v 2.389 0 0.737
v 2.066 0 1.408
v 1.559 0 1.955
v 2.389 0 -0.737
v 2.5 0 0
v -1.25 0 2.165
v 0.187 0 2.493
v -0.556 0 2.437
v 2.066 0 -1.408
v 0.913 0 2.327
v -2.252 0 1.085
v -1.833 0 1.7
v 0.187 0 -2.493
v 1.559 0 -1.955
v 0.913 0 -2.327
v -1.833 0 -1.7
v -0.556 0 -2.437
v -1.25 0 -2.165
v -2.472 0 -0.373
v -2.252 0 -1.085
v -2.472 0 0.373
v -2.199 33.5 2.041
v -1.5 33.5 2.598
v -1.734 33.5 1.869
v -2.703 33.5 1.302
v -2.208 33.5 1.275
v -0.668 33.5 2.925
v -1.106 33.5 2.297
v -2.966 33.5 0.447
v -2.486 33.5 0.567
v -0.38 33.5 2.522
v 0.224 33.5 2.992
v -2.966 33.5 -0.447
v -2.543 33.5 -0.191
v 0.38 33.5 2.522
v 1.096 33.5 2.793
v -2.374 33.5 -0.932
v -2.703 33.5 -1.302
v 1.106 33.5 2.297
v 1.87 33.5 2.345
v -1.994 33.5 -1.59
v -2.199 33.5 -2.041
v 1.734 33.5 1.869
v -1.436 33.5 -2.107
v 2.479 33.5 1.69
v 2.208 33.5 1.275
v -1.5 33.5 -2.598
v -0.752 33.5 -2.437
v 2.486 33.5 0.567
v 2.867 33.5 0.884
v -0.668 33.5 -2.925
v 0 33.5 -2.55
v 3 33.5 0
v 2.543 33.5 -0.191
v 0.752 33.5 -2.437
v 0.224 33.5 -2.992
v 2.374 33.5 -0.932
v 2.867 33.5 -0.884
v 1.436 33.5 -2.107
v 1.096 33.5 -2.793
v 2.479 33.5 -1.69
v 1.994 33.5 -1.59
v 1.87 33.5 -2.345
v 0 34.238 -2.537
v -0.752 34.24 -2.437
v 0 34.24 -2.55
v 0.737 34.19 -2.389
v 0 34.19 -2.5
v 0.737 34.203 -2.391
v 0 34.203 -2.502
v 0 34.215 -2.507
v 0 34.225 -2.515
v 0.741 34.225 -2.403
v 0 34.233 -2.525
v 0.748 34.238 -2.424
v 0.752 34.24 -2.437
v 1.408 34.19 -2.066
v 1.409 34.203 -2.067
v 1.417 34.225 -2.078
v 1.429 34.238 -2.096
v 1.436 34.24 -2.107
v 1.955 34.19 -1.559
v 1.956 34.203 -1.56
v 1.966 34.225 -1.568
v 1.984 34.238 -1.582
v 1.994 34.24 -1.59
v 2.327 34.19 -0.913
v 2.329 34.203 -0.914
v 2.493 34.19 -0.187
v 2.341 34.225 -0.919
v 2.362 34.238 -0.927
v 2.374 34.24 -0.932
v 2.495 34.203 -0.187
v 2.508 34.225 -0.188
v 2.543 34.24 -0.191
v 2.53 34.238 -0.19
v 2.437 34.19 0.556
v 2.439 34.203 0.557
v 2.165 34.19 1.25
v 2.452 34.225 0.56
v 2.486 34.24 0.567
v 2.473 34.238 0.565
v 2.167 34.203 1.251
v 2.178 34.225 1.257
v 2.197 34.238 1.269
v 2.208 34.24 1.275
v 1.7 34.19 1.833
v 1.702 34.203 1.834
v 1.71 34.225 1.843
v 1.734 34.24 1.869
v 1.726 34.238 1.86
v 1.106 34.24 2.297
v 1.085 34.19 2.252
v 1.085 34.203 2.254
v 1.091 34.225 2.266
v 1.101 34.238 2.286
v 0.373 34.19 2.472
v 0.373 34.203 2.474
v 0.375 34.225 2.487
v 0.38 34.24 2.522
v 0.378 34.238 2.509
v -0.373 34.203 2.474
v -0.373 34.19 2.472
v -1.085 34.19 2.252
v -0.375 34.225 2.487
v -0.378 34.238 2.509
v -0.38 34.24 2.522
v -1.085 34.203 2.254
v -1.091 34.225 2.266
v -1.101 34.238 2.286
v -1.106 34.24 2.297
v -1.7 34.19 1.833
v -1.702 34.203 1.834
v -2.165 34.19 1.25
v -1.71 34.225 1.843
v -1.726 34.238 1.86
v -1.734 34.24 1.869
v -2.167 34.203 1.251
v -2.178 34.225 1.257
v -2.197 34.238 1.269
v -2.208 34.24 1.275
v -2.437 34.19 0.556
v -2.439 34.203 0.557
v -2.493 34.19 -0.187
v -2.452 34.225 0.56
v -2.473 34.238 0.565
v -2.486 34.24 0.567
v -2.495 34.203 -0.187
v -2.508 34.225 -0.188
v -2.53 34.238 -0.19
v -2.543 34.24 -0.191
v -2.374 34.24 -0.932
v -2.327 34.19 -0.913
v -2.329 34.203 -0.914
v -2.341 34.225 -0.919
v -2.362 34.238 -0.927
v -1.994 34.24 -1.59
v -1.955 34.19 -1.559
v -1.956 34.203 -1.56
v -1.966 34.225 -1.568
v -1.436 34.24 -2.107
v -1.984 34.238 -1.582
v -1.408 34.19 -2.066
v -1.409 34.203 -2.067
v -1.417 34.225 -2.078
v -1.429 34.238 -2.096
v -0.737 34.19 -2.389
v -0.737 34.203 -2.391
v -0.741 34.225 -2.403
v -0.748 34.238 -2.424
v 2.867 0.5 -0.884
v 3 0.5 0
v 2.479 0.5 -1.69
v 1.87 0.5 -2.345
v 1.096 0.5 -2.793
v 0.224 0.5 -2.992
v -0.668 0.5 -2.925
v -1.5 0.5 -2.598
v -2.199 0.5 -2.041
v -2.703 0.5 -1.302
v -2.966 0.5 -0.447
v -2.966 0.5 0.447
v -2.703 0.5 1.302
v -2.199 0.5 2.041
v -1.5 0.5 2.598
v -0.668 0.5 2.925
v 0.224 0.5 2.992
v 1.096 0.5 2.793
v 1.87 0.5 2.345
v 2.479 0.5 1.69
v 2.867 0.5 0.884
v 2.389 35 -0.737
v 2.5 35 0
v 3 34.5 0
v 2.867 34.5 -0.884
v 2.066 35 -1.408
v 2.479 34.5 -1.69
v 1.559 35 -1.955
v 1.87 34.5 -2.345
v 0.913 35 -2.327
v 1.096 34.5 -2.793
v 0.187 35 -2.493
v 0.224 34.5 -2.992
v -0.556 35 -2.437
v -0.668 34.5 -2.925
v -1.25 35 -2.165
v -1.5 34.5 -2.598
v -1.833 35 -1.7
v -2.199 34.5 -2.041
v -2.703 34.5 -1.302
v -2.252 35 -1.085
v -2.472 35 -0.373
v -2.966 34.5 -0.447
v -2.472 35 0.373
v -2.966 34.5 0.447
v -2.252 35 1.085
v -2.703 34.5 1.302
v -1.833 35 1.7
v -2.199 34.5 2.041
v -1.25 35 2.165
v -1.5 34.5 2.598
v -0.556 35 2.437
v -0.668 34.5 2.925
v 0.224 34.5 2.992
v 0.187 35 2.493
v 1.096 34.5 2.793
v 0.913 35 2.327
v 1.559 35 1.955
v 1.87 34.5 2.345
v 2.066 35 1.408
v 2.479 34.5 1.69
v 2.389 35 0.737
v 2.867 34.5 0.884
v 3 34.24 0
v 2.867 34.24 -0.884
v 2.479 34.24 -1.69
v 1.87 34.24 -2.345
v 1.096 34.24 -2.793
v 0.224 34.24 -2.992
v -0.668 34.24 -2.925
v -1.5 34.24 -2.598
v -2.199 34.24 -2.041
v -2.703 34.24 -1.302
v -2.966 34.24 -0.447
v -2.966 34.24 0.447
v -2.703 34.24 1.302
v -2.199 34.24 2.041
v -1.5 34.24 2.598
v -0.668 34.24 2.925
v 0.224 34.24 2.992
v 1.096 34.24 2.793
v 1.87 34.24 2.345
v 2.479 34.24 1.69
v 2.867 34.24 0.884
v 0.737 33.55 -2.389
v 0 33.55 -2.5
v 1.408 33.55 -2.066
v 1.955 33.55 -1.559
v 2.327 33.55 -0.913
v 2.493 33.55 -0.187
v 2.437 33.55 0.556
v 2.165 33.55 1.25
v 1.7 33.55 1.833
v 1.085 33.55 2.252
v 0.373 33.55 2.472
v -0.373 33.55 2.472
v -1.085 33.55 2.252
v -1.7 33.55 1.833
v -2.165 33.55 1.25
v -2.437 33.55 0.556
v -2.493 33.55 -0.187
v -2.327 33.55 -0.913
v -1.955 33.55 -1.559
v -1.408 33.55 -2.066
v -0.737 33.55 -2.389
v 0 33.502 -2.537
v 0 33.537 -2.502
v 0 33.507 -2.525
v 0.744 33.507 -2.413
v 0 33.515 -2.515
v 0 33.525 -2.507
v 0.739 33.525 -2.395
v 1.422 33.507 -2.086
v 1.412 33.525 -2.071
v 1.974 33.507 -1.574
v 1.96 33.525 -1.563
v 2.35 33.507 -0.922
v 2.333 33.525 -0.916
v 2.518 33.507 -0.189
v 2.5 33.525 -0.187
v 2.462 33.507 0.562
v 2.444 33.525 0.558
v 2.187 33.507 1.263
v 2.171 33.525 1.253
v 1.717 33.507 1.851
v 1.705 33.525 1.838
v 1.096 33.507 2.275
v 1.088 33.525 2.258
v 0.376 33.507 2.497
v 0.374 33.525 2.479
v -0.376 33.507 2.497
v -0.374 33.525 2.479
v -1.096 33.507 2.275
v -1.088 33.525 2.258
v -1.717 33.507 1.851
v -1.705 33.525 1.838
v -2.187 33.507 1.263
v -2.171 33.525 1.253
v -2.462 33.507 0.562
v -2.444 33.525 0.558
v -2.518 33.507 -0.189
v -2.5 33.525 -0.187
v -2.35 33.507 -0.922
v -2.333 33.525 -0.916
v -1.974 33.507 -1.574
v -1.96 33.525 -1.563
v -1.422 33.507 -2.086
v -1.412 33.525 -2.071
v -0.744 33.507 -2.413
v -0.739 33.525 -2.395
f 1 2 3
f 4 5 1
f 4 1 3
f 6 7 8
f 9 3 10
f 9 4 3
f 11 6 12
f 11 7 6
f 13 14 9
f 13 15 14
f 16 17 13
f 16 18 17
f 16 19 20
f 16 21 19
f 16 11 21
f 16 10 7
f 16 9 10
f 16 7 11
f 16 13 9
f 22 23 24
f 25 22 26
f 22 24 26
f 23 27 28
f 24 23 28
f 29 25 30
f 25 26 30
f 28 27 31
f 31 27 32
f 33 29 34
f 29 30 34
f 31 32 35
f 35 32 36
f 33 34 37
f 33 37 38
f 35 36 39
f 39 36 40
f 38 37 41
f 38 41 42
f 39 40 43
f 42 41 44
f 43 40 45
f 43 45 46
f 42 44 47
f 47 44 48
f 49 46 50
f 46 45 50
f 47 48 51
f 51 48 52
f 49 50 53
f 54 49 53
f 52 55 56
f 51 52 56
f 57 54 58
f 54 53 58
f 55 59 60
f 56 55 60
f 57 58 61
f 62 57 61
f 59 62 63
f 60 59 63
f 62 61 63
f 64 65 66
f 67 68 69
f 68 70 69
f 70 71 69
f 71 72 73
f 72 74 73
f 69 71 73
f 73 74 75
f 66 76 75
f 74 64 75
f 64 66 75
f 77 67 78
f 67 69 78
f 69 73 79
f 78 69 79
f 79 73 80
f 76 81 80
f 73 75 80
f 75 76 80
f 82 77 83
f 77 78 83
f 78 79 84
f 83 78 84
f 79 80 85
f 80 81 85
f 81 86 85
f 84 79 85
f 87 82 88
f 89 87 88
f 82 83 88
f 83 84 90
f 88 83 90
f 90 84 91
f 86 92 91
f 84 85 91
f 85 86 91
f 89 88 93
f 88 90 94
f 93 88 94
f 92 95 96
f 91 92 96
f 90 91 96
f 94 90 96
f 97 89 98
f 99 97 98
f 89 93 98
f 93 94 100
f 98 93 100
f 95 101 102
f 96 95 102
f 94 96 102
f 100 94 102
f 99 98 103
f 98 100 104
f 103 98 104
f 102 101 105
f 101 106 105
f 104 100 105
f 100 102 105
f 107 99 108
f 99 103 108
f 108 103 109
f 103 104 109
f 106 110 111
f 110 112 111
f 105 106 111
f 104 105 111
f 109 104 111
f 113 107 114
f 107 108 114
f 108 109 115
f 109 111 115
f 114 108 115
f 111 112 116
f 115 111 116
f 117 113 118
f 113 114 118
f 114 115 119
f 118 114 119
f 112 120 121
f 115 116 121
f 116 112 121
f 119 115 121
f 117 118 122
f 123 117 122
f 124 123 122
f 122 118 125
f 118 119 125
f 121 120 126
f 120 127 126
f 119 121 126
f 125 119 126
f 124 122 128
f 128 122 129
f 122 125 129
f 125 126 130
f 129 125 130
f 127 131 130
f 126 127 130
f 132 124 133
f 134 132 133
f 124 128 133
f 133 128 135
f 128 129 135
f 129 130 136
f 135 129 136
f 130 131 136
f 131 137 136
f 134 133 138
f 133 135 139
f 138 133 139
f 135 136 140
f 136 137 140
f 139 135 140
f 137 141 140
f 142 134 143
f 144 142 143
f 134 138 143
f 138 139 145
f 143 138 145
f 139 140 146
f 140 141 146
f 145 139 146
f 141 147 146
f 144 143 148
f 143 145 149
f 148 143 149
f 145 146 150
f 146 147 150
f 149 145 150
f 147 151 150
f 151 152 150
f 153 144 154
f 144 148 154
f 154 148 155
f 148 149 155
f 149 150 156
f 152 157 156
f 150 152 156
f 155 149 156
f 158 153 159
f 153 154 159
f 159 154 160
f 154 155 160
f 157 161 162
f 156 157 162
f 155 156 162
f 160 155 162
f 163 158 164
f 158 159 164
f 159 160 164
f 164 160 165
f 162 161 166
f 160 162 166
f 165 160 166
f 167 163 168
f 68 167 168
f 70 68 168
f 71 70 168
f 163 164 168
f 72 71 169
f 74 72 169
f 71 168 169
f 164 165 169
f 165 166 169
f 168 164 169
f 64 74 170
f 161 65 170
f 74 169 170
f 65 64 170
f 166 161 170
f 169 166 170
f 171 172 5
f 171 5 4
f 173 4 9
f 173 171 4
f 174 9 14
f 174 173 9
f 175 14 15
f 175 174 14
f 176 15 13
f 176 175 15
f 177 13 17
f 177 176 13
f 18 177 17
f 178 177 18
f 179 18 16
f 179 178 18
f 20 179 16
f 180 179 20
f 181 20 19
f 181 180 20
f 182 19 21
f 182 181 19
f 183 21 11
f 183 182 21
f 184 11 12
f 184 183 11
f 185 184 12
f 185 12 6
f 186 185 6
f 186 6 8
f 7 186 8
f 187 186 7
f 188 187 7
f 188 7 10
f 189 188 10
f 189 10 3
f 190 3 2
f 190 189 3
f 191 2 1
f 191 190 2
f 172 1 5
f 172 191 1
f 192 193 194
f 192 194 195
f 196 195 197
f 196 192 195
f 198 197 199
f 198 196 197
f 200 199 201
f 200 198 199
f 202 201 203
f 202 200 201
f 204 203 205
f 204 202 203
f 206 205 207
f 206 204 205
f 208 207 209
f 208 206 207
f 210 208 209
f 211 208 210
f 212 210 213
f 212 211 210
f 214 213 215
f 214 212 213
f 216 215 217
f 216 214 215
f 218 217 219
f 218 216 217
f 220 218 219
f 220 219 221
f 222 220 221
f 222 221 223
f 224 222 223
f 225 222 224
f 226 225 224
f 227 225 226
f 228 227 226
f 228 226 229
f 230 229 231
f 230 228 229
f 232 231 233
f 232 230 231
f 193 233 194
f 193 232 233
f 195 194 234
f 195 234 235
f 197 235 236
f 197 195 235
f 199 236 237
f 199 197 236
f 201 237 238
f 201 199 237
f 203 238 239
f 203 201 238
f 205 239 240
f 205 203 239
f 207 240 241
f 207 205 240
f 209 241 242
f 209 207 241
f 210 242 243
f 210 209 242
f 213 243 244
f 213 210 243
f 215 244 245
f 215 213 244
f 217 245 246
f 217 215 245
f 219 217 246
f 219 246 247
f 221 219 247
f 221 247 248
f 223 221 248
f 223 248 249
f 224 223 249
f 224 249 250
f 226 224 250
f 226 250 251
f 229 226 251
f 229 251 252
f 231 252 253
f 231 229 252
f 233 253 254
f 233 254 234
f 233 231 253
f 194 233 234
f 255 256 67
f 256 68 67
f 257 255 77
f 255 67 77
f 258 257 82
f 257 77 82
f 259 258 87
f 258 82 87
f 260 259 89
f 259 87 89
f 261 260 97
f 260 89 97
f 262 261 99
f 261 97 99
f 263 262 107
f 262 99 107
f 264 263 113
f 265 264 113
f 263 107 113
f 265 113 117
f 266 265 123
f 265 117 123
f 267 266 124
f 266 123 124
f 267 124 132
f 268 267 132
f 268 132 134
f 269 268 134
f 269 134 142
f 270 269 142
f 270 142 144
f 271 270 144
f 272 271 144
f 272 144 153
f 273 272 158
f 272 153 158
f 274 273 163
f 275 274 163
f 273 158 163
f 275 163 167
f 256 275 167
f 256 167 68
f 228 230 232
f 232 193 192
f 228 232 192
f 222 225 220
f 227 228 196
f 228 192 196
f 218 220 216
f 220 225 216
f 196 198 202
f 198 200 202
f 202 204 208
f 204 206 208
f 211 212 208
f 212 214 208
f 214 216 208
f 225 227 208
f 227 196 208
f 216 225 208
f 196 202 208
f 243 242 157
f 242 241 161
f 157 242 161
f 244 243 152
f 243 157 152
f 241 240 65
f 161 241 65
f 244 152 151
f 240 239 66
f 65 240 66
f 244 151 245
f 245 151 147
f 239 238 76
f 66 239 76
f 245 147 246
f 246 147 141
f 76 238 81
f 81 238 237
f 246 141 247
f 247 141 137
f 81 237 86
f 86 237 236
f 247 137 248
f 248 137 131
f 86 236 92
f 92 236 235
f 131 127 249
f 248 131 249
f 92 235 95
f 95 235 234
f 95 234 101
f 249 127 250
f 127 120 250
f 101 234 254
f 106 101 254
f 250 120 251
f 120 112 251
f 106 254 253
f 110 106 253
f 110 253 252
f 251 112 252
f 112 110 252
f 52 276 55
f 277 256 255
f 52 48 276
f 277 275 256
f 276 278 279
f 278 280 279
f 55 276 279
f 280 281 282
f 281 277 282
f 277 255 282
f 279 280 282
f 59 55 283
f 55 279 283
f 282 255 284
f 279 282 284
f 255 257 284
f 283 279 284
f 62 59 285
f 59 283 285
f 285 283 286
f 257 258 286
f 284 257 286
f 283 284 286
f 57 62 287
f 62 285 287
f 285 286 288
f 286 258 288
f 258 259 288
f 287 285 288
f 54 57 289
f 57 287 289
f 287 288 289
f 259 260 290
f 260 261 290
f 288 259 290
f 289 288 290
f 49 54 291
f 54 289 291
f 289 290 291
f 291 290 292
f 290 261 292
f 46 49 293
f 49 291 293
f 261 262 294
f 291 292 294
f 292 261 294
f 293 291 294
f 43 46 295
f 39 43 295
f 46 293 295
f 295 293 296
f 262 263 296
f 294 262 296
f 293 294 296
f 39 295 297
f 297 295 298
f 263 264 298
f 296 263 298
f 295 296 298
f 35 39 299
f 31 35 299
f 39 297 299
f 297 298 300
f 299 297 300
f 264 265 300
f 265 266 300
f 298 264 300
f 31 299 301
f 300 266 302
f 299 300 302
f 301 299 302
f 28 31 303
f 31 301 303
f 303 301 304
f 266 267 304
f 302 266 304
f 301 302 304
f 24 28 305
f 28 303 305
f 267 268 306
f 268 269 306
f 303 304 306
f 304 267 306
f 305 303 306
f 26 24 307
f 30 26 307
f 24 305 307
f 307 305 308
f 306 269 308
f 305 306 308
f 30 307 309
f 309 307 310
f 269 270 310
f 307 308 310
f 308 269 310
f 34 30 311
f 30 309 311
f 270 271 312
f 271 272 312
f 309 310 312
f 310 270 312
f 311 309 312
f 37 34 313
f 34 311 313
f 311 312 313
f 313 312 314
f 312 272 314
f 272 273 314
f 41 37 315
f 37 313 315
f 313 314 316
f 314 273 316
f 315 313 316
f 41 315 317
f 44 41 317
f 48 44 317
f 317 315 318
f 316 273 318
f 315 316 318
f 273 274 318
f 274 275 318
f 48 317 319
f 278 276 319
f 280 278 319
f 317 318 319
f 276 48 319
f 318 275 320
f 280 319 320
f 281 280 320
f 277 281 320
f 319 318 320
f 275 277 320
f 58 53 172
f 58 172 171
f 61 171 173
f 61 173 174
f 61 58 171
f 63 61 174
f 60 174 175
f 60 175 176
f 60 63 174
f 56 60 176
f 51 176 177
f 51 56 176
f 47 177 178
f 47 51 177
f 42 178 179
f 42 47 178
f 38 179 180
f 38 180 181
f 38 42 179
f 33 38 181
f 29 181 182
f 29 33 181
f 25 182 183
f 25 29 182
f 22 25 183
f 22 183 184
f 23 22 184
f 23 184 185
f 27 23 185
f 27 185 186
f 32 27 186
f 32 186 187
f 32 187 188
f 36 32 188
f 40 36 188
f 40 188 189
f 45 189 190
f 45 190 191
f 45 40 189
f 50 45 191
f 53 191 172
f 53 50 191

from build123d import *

# Parameters (mm, degrees)
SKETCH1_W     = 3
SKETCH1_H     = 35
CHAMFER1_SIZE = 0.5


with BuildPart() as part:
    # Sketch1 → Revolve1 (revolve)
    with BuildSketch(Plane.XY):
        with Locations((1.5, 17.5)):
            Rectangle(SKETCH1_W, SKETCH1_H)
    revolve(axis=Axis((0, 0, 0), (0, 1, 0)))

    # Sketch3 → Groove for DIN 471 - 4 x 0.4, Circlip for shafts - normal1 (revolve, cut)
    with BuildSketch(Plane(origin=(0, 0, 0), x_dir=(0, 0, -1), z_dir=(-1, 0, 0))):
        with BuildLine():
            Line((2.55, -34.24), (3.6, -34.24))
            Line((3.6, -34.24), (3.6, -33.5))
            Line((3.6, -33.5), (2.55, -33.5))
            ThreePointArc((2.55, -33.5), (2.514644661, -33.514644661), (2.5, -33.55))
            Line((2.5, -33.55), (2.5, -34.19))
            ThreePointArc((2.5, -34.19), (2.514644661, -34.225355339), (2.55, -34.24))
        make_face()
    revolve(axis=Axis((0, 50, 0), (0, -1, 0)), mode=Mode.SUBTRACT)

    # Chamfer1
    chamfer1_edges = [part.edges().sort_by_distance(p)[0] for p in [
        (-3, 0, 0),
        (-3, 35, 0),
    ]]
    chamfer(chamfer1_edges, length=CHAMFER1_SIZE)


solid = part.part
